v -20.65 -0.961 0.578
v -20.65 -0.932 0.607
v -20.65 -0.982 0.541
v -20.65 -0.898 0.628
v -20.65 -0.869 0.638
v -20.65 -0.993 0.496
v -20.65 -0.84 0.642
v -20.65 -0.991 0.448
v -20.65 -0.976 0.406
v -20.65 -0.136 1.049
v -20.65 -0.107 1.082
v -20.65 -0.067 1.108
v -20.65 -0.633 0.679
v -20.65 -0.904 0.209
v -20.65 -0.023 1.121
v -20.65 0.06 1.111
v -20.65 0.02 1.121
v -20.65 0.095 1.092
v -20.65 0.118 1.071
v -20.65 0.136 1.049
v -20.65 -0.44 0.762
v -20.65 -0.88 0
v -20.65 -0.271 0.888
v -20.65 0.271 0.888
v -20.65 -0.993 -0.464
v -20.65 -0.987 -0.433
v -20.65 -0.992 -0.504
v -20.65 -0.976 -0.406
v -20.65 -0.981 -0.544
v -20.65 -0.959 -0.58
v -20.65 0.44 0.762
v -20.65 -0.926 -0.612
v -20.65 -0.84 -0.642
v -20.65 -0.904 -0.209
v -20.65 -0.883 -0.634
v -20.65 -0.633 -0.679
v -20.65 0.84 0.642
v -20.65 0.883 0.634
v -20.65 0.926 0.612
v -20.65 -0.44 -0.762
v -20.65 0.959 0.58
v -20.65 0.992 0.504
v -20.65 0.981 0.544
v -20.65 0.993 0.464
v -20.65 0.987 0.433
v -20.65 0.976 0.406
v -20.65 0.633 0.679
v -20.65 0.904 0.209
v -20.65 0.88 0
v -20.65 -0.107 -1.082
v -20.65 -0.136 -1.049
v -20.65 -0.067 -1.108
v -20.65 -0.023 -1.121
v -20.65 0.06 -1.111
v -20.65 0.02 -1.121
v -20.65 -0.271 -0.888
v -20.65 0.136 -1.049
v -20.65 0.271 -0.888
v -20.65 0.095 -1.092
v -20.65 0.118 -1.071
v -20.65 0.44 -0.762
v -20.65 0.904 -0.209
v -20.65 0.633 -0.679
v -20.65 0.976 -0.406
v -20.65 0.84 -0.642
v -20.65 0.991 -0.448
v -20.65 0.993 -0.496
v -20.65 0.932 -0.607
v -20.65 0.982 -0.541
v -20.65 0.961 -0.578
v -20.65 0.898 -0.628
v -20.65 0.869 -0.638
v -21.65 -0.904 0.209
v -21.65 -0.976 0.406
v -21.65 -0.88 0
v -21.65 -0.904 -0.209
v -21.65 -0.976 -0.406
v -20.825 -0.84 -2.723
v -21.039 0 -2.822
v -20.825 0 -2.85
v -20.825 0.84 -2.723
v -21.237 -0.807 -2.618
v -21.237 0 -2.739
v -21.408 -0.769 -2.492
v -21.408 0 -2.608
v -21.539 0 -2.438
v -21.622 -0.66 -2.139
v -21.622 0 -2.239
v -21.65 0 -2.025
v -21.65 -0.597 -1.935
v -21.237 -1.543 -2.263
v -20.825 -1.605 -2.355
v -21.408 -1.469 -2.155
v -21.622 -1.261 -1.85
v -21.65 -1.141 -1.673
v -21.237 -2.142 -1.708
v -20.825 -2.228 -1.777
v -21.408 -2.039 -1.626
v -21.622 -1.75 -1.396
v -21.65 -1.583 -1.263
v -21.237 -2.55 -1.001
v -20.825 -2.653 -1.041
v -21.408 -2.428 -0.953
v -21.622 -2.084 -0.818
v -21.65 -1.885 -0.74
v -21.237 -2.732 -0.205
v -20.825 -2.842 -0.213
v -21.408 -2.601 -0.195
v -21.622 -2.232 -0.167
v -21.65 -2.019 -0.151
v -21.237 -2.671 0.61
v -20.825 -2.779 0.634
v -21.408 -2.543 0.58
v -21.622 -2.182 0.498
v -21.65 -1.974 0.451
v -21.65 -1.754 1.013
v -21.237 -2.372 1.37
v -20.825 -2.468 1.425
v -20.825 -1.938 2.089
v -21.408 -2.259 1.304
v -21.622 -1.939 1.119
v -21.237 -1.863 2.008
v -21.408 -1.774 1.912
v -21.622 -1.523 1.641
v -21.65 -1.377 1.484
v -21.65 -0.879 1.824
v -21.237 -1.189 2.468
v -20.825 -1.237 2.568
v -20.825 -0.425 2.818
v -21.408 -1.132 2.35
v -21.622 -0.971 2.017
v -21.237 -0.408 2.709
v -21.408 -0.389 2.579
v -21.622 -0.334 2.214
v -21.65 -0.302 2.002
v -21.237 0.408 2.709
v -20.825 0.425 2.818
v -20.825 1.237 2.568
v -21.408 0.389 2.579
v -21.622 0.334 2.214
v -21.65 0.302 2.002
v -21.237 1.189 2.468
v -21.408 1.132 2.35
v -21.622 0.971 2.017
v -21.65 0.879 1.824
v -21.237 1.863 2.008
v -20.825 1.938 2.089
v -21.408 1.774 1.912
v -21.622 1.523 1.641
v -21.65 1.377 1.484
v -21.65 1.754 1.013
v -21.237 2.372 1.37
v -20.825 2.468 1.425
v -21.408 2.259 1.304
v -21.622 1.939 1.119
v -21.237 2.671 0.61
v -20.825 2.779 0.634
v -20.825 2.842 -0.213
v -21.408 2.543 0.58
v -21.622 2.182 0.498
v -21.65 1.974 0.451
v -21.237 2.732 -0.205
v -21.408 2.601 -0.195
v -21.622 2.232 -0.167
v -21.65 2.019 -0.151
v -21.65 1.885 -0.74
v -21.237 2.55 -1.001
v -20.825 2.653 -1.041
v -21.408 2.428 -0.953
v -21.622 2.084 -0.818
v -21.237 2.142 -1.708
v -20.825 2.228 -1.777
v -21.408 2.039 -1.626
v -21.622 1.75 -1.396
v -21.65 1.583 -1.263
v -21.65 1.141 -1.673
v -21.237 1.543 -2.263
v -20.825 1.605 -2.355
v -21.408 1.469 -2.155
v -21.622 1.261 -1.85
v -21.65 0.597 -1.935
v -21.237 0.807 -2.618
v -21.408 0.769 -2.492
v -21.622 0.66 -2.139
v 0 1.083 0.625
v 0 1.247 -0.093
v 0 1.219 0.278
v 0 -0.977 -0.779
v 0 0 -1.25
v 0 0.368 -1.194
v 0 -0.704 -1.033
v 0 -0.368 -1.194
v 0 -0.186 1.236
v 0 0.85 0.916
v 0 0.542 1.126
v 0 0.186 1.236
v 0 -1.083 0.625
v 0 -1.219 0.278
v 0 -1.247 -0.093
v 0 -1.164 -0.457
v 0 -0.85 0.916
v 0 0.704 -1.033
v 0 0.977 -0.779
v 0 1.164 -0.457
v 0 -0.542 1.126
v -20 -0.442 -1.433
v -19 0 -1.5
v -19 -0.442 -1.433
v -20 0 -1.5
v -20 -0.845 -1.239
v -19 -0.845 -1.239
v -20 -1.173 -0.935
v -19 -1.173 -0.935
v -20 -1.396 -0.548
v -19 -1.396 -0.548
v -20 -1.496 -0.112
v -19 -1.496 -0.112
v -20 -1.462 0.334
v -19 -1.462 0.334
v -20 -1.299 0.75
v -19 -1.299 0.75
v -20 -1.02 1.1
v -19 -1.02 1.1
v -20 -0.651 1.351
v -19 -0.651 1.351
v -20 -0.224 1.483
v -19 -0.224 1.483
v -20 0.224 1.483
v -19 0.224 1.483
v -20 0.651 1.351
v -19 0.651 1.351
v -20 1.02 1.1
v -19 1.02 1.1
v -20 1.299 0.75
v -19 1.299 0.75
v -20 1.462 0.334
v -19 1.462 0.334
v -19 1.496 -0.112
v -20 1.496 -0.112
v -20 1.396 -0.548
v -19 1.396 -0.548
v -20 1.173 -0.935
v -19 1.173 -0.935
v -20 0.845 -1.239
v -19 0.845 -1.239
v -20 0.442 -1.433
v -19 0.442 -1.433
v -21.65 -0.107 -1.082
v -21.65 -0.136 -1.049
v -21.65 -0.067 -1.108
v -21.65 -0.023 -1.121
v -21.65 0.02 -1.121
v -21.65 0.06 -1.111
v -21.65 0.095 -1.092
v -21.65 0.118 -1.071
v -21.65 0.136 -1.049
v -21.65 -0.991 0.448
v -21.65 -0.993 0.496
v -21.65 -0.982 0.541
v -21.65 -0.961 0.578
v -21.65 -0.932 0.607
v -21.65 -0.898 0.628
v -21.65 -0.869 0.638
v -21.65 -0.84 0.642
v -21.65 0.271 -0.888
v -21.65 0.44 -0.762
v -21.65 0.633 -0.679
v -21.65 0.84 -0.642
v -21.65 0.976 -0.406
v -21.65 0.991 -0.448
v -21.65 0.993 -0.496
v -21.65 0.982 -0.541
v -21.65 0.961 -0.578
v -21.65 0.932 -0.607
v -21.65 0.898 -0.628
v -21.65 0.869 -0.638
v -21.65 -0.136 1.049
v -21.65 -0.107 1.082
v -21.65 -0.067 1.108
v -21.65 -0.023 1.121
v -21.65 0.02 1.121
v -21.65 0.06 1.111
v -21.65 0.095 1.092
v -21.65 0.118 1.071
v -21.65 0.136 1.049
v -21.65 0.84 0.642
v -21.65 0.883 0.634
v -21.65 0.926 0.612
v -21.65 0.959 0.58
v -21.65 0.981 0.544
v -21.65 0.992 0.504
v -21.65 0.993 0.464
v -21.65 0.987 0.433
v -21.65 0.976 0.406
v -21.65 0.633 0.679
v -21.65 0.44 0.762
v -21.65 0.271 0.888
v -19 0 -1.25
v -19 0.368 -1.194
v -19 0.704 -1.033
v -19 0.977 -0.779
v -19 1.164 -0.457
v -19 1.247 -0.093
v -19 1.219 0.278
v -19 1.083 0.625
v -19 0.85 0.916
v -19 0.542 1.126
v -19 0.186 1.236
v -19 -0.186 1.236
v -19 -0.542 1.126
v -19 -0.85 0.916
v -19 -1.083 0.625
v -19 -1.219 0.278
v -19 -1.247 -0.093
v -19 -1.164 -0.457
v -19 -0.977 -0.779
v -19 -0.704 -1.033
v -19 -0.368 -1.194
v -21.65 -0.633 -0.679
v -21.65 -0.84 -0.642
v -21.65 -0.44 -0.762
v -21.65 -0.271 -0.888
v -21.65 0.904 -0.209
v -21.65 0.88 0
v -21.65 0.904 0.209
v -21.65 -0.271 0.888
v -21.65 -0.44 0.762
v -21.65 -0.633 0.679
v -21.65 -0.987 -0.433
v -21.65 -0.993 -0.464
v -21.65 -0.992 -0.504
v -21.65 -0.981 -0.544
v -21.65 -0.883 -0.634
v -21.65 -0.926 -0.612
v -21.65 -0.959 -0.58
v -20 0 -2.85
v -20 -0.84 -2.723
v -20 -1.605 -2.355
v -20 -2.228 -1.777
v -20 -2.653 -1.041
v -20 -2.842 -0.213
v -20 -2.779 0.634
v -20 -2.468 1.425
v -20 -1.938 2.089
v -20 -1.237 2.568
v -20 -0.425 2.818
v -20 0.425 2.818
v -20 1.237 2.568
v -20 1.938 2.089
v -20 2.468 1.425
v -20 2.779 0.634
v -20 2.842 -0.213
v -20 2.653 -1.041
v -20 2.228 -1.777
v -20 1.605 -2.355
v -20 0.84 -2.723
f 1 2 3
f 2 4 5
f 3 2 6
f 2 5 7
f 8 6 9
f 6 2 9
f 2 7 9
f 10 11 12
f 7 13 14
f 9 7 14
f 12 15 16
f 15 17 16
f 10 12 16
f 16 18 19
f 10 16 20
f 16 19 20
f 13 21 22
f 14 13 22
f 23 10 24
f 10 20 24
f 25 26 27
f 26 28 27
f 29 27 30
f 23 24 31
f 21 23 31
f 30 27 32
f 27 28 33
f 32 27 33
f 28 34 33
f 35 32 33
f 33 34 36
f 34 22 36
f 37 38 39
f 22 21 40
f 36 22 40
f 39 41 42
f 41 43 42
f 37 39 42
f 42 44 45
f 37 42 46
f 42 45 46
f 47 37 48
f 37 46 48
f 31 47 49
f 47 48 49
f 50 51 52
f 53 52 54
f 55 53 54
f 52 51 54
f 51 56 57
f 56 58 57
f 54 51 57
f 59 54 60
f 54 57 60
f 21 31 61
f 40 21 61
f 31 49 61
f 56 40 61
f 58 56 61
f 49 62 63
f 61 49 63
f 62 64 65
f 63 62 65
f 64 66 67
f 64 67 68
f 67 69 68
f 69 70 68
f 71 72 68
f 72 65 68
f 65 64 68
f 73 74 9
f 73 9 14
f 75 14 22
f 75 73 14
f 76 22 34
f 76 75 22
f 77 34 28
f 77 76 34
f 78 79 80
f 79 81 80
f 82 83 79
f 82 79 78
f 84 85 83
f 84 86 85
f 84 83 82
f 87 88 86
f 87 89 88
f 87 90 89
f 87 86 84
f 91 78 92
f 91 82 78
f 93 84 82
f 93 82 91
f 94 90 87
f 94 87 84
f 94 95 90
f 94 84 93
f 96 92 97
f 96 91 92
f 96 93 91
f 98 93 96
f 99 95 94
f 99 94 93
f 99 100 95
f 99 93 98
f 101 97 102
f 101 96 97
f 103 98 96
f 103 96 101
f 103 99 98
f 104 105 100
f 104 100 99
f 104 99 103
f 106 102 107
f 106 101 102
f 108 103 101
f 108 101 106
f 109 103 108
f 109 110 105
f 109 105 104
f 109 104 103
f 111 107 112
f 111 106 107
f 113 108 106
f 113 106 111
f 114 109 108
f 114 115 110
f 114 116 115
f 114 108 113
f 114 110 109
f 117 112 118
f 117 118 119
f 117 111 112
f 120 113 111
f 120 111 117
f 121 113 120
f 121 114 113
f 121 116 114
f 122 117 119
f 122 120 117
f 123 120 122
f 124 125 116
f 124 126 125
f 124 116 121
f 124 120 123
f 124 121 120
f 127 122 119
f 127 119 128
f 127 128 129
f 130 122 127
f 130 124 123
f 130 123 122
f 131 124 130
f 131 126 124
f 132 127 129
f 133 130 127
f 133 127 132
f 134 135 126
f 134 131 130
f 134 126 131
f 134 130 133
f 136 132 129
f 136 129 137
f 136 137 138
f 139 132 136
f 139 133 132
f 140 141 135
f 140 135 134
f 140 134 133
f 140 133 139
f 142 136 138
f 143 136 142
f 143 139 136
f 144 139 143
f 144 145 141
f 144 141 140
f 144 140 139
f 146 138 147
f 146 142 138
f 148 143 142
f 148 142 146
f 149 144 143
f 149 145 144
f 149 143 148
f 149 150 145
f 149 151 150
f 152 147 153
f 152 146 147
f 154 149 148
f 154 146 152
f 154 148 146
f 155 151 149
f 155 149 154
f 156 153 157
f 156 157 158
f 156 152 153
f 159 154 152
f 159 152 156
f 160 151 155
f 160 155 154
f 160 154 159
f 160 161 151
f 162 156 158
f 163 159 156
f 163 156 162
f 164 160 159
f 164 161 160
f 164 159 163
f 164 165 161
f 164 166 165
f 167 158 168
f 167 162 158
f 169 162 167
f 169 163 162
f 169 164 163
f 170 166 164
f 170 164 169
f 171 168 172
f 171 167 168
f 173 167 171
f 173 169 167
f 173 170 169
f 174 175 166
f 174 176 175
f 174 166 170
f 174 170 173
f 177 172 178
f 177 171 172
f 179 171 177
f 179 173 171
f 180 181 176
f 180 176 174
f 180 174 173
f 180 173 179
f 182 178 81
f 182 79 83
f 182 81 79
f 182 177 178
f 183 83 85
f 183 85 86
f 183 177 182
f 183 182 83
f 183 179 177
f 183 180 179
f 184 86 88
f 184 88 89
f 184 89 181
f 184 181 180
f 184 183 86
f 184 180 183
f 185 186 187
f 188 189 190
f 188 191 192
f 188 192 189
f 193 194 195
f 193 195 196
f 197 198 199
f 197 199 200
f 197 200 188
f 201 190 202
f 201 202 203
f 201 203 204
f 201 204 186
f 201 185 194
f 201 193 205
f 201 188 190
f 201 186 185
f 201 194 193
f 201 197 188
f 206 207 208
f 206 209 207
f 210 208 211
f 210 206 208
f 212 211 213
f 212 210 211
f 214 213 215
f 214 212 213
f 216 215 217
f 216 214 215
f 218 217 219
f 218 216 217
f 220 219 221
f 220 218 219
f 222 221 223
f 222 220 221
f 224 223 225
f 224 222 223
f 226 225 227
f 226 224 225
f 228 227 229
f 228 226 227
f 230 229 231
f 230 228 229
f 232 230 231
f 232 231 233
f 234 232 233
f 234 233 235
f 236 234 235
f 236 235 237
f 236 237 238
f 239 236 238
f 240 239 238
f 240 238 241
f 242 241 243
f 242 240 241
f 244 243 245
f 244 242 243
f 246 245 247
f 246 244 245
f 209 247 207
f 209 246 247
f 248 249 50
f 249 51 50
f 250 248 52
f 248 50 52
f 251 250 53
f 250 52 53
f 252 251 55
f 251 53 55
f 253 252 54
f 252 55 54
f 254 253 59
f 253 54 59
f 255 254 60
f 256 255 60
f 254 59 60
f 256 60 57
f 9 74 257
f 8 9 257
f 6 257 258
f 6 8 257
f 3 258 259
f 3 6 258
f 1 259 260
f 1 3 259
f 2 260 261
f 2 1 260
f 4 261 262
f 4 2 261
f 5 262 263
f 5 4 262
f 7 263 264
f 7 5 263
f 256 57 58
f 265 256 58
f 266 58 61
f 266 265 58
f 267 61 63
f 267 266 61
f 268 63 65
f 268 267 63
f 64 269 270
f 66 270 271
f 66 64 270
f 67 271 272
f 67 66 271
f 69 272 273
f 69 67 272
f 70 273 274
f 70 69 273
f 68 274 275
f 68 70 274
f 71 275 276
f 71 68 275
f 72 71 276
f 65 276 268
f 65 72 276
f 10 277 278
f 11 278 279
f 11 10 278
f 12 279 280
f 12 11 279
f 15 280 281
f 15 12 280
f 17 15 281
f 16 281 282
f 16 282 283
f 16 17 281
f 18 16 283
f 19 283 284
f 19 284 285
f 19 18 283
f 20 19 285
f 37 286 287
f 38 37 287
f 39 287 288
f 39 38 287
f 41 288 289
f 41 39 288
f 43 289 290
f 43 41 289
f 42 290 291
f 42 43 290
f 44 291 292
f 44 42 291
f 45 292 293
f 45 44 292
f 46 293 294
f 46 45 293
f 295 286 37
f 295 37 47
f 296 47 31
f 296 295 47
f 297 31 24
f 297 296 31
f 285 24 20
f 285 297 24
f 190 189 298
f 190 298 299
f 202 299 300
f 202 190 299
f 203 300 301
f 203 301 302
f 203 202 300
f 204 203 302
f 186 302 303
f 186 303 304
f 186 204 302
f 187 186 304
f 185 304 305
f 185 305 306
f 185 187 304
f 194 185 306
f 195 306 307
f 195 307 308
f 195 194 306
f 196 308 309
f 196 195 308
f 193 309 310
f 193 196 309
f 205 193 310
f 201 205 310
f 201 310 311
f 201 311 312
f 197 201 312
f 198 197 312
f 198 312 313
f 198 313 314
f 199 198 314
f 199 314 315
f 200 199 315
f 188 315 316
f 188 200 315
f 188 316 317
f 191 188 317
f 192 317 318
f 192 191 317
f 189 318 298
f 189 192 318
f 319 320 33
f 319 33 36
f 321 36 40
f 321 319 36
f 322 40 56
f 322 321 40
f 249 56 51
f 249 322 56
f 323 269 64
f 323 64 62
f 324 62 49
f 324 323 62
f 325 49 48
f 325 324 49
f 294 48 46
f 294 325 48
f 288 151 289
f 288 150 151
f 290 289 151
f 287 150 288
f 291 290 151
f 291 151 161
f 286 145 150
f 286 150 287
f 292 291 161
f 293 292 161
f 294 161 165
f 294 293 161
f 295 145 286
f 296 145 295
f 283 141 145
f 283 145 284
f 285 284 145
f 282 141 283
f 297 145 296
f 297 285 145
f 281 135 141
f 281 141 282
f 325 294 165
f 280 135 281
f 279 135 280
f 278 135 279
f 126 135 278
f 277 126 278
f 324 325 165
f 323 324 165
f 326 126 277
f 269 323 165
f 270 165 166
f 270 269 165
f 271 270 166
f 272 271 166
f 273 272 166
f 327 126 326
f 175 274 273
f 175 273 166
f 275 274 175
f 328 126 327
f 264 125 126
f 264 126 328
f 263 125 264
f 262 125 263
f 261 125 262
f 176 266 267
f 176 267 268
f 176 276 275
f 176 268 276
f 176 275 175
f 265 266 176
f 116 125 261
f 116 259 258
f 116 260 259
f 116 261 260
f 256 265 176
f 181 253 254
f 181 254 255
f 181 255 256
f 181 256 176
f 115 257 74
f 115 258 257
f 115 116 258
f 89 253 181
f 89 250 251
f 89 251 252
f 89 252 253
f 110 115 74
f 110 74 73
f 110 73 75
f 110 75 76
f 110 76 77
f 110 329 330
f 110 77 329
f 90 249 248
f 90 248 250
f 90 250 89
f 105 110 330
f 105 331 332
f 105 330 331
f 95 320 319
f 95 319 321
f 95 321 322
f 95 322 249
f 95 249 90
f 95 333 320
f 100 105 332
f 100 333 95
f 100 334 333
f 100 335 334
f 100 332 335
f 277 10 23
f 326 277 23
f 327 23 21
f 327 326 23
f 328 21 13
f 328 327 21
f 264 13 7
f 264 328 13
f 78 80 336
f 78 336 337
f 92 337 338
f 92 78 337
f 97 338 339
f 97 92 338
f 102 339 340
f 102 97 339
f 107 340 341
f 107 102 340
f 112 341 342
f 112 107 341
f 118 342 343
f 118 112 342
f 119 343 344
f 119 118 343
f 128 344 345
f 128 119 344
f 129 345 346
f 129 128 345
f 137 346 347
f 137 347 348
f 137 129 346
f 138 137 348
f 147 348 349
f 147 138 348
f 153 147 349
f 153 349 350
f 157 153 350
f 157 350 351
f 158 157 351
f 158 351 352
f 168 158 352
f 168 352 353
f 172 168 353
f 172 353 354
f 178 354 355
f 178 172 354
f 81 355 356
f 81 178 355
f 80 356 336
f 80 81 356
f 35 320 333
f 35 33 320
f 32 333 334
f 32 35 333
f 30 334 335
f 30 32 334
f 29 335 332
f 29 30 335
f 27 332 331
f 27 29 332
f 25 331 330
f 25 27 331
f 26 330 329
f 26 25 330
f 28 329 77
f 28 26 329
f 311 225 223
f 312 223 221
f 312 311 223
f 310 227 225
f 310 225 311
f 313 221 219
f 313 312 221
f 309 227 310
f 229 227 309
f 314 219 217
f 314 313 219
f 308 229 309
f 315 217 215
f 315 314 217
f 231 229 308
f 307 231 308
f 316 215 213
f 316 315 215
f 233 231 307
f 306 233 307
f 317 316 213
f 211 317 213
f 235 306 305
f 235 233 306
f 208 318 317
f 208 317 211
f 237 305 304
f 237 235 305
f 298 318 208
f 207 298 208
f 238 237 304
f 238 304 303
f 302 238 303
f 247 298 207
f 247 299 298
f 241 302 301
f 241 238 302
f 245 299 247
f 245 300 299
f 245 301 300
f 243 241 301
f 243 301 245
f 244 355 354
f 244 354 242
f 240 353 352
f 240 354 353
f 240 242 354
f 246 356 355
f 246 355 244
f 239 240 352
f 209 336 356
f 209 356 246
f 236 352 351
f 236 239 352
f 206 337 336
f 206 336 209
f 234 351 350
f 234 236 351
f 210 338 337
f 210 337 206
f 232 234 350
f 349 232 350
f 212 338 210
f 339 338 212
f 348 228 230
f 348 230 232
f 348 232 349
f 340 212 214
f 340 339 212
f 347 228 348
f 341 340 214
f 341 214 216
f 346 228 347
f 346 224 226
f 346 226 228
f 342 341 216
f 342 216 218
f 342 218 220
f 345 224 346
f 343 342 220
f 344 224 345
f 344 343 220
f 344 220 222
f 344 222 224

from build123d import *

# Parameters (mm, degrees)
EXTRUDE1_DEPTH    = 1
FILLET1_R         = 0.825
FILLET2_R         = 0.162857143
SKETCH3_OUTSIDE_W = 12.32
SKETCH3_OUTSIDE_H = 12.32
SKETCH3_OUTSIDE_R = 1.25
SIS_KIERRE_DEPTH  = 19


with BuildPart() as part:
    # Sketch1 → Revolve1 (revolve)
    with BuildSketch(Plane.XY, mode=Mode.PRIVATE) as revolve1_sk:
        Polygon((-20, 2.85), (-21.65, 2.85), (-21.65, 0), (0, 0), (0, 1.5), (-20, 1.5), align=None)
    revolve(revolve1_sk.sketch.rotate(Axis((22.773389601, 0, 0), (-1, 0, 0)), 90), axis=Axis((22.773389601, 0, 0), (-1, 0, 0)))

    # Sketch2 → Extrude1 (cut)
    with BuildSketch(Plane.ZY.offset(21.65)):
        with BuildLine():
            ThreePointArc((-1.4, 0), (-0.761857658, 0.439858724), (-0.7, 1.212435565))
            ThreePointArc((-0.7, 1.212435565), (0, 0.879717448), (0.7, 1.212435565))
            ThreePointArc((0.7, 1.212435565), (0.761857658, 0.439858724), (1.4, 0))
            ThreePointArc((1.4, 0), (0.761857658, -0.439858724), (0.7, -1.212435565))
            ThreePointArc((0.7, -1.212435565), (0, -0.879717448), (-0.7, -1.212435565))
            ThreePointArc((-0.7, -1.212435565), (-0.761857658, -0.439858724), (-1.4, 0))
        make_face()
    extrude(amount=-EXTRUDE1_DEPTH, mode=Mode.SUBTRACT)

    # Fillet1
    fillet1_edges = [part.edges().sort_by_distance(p)[0] for p in [
        (-21.65, 0, 2.85),
    ]]
    fillet(fillet1_edges, radius=FILLET1_R)

    # Fillet2
    fillet2_edges = [part.edges().sort_by_distance(p)[0] for p in [
        (-21.15, 0, -1.4),
        (-21.15, 1.212435565, -0.7),
        (-21.15, 1.212435565, 0.7),
        (-21.15, 0, 1.4),
        (-21.15, -1.212435565, 0.7),
        (-21.15, -1.212435565, -0.7),
    ]]
    fillet(fillet2_edges, radius=FILLET2_R)

    # Sketch3 outside → Sisäkierre (cut)
    with BuildSketch(Plane(origin=(0, 0, 0), x_dir=(0, 0, -1), z_dir=(1, 0, 0))):
        Rectangle(SKETCH3_OUTSIDE_W, SKETCH3_OUTSIDE_H)
        Circle(SKETCH3_OUTSIDE_R, mode=Mode.SUBTRACT)
    extrude(amount=-SIS_KIERRE_DEPTH, mode=Mode.SUBTRACT)


solid = part.part
